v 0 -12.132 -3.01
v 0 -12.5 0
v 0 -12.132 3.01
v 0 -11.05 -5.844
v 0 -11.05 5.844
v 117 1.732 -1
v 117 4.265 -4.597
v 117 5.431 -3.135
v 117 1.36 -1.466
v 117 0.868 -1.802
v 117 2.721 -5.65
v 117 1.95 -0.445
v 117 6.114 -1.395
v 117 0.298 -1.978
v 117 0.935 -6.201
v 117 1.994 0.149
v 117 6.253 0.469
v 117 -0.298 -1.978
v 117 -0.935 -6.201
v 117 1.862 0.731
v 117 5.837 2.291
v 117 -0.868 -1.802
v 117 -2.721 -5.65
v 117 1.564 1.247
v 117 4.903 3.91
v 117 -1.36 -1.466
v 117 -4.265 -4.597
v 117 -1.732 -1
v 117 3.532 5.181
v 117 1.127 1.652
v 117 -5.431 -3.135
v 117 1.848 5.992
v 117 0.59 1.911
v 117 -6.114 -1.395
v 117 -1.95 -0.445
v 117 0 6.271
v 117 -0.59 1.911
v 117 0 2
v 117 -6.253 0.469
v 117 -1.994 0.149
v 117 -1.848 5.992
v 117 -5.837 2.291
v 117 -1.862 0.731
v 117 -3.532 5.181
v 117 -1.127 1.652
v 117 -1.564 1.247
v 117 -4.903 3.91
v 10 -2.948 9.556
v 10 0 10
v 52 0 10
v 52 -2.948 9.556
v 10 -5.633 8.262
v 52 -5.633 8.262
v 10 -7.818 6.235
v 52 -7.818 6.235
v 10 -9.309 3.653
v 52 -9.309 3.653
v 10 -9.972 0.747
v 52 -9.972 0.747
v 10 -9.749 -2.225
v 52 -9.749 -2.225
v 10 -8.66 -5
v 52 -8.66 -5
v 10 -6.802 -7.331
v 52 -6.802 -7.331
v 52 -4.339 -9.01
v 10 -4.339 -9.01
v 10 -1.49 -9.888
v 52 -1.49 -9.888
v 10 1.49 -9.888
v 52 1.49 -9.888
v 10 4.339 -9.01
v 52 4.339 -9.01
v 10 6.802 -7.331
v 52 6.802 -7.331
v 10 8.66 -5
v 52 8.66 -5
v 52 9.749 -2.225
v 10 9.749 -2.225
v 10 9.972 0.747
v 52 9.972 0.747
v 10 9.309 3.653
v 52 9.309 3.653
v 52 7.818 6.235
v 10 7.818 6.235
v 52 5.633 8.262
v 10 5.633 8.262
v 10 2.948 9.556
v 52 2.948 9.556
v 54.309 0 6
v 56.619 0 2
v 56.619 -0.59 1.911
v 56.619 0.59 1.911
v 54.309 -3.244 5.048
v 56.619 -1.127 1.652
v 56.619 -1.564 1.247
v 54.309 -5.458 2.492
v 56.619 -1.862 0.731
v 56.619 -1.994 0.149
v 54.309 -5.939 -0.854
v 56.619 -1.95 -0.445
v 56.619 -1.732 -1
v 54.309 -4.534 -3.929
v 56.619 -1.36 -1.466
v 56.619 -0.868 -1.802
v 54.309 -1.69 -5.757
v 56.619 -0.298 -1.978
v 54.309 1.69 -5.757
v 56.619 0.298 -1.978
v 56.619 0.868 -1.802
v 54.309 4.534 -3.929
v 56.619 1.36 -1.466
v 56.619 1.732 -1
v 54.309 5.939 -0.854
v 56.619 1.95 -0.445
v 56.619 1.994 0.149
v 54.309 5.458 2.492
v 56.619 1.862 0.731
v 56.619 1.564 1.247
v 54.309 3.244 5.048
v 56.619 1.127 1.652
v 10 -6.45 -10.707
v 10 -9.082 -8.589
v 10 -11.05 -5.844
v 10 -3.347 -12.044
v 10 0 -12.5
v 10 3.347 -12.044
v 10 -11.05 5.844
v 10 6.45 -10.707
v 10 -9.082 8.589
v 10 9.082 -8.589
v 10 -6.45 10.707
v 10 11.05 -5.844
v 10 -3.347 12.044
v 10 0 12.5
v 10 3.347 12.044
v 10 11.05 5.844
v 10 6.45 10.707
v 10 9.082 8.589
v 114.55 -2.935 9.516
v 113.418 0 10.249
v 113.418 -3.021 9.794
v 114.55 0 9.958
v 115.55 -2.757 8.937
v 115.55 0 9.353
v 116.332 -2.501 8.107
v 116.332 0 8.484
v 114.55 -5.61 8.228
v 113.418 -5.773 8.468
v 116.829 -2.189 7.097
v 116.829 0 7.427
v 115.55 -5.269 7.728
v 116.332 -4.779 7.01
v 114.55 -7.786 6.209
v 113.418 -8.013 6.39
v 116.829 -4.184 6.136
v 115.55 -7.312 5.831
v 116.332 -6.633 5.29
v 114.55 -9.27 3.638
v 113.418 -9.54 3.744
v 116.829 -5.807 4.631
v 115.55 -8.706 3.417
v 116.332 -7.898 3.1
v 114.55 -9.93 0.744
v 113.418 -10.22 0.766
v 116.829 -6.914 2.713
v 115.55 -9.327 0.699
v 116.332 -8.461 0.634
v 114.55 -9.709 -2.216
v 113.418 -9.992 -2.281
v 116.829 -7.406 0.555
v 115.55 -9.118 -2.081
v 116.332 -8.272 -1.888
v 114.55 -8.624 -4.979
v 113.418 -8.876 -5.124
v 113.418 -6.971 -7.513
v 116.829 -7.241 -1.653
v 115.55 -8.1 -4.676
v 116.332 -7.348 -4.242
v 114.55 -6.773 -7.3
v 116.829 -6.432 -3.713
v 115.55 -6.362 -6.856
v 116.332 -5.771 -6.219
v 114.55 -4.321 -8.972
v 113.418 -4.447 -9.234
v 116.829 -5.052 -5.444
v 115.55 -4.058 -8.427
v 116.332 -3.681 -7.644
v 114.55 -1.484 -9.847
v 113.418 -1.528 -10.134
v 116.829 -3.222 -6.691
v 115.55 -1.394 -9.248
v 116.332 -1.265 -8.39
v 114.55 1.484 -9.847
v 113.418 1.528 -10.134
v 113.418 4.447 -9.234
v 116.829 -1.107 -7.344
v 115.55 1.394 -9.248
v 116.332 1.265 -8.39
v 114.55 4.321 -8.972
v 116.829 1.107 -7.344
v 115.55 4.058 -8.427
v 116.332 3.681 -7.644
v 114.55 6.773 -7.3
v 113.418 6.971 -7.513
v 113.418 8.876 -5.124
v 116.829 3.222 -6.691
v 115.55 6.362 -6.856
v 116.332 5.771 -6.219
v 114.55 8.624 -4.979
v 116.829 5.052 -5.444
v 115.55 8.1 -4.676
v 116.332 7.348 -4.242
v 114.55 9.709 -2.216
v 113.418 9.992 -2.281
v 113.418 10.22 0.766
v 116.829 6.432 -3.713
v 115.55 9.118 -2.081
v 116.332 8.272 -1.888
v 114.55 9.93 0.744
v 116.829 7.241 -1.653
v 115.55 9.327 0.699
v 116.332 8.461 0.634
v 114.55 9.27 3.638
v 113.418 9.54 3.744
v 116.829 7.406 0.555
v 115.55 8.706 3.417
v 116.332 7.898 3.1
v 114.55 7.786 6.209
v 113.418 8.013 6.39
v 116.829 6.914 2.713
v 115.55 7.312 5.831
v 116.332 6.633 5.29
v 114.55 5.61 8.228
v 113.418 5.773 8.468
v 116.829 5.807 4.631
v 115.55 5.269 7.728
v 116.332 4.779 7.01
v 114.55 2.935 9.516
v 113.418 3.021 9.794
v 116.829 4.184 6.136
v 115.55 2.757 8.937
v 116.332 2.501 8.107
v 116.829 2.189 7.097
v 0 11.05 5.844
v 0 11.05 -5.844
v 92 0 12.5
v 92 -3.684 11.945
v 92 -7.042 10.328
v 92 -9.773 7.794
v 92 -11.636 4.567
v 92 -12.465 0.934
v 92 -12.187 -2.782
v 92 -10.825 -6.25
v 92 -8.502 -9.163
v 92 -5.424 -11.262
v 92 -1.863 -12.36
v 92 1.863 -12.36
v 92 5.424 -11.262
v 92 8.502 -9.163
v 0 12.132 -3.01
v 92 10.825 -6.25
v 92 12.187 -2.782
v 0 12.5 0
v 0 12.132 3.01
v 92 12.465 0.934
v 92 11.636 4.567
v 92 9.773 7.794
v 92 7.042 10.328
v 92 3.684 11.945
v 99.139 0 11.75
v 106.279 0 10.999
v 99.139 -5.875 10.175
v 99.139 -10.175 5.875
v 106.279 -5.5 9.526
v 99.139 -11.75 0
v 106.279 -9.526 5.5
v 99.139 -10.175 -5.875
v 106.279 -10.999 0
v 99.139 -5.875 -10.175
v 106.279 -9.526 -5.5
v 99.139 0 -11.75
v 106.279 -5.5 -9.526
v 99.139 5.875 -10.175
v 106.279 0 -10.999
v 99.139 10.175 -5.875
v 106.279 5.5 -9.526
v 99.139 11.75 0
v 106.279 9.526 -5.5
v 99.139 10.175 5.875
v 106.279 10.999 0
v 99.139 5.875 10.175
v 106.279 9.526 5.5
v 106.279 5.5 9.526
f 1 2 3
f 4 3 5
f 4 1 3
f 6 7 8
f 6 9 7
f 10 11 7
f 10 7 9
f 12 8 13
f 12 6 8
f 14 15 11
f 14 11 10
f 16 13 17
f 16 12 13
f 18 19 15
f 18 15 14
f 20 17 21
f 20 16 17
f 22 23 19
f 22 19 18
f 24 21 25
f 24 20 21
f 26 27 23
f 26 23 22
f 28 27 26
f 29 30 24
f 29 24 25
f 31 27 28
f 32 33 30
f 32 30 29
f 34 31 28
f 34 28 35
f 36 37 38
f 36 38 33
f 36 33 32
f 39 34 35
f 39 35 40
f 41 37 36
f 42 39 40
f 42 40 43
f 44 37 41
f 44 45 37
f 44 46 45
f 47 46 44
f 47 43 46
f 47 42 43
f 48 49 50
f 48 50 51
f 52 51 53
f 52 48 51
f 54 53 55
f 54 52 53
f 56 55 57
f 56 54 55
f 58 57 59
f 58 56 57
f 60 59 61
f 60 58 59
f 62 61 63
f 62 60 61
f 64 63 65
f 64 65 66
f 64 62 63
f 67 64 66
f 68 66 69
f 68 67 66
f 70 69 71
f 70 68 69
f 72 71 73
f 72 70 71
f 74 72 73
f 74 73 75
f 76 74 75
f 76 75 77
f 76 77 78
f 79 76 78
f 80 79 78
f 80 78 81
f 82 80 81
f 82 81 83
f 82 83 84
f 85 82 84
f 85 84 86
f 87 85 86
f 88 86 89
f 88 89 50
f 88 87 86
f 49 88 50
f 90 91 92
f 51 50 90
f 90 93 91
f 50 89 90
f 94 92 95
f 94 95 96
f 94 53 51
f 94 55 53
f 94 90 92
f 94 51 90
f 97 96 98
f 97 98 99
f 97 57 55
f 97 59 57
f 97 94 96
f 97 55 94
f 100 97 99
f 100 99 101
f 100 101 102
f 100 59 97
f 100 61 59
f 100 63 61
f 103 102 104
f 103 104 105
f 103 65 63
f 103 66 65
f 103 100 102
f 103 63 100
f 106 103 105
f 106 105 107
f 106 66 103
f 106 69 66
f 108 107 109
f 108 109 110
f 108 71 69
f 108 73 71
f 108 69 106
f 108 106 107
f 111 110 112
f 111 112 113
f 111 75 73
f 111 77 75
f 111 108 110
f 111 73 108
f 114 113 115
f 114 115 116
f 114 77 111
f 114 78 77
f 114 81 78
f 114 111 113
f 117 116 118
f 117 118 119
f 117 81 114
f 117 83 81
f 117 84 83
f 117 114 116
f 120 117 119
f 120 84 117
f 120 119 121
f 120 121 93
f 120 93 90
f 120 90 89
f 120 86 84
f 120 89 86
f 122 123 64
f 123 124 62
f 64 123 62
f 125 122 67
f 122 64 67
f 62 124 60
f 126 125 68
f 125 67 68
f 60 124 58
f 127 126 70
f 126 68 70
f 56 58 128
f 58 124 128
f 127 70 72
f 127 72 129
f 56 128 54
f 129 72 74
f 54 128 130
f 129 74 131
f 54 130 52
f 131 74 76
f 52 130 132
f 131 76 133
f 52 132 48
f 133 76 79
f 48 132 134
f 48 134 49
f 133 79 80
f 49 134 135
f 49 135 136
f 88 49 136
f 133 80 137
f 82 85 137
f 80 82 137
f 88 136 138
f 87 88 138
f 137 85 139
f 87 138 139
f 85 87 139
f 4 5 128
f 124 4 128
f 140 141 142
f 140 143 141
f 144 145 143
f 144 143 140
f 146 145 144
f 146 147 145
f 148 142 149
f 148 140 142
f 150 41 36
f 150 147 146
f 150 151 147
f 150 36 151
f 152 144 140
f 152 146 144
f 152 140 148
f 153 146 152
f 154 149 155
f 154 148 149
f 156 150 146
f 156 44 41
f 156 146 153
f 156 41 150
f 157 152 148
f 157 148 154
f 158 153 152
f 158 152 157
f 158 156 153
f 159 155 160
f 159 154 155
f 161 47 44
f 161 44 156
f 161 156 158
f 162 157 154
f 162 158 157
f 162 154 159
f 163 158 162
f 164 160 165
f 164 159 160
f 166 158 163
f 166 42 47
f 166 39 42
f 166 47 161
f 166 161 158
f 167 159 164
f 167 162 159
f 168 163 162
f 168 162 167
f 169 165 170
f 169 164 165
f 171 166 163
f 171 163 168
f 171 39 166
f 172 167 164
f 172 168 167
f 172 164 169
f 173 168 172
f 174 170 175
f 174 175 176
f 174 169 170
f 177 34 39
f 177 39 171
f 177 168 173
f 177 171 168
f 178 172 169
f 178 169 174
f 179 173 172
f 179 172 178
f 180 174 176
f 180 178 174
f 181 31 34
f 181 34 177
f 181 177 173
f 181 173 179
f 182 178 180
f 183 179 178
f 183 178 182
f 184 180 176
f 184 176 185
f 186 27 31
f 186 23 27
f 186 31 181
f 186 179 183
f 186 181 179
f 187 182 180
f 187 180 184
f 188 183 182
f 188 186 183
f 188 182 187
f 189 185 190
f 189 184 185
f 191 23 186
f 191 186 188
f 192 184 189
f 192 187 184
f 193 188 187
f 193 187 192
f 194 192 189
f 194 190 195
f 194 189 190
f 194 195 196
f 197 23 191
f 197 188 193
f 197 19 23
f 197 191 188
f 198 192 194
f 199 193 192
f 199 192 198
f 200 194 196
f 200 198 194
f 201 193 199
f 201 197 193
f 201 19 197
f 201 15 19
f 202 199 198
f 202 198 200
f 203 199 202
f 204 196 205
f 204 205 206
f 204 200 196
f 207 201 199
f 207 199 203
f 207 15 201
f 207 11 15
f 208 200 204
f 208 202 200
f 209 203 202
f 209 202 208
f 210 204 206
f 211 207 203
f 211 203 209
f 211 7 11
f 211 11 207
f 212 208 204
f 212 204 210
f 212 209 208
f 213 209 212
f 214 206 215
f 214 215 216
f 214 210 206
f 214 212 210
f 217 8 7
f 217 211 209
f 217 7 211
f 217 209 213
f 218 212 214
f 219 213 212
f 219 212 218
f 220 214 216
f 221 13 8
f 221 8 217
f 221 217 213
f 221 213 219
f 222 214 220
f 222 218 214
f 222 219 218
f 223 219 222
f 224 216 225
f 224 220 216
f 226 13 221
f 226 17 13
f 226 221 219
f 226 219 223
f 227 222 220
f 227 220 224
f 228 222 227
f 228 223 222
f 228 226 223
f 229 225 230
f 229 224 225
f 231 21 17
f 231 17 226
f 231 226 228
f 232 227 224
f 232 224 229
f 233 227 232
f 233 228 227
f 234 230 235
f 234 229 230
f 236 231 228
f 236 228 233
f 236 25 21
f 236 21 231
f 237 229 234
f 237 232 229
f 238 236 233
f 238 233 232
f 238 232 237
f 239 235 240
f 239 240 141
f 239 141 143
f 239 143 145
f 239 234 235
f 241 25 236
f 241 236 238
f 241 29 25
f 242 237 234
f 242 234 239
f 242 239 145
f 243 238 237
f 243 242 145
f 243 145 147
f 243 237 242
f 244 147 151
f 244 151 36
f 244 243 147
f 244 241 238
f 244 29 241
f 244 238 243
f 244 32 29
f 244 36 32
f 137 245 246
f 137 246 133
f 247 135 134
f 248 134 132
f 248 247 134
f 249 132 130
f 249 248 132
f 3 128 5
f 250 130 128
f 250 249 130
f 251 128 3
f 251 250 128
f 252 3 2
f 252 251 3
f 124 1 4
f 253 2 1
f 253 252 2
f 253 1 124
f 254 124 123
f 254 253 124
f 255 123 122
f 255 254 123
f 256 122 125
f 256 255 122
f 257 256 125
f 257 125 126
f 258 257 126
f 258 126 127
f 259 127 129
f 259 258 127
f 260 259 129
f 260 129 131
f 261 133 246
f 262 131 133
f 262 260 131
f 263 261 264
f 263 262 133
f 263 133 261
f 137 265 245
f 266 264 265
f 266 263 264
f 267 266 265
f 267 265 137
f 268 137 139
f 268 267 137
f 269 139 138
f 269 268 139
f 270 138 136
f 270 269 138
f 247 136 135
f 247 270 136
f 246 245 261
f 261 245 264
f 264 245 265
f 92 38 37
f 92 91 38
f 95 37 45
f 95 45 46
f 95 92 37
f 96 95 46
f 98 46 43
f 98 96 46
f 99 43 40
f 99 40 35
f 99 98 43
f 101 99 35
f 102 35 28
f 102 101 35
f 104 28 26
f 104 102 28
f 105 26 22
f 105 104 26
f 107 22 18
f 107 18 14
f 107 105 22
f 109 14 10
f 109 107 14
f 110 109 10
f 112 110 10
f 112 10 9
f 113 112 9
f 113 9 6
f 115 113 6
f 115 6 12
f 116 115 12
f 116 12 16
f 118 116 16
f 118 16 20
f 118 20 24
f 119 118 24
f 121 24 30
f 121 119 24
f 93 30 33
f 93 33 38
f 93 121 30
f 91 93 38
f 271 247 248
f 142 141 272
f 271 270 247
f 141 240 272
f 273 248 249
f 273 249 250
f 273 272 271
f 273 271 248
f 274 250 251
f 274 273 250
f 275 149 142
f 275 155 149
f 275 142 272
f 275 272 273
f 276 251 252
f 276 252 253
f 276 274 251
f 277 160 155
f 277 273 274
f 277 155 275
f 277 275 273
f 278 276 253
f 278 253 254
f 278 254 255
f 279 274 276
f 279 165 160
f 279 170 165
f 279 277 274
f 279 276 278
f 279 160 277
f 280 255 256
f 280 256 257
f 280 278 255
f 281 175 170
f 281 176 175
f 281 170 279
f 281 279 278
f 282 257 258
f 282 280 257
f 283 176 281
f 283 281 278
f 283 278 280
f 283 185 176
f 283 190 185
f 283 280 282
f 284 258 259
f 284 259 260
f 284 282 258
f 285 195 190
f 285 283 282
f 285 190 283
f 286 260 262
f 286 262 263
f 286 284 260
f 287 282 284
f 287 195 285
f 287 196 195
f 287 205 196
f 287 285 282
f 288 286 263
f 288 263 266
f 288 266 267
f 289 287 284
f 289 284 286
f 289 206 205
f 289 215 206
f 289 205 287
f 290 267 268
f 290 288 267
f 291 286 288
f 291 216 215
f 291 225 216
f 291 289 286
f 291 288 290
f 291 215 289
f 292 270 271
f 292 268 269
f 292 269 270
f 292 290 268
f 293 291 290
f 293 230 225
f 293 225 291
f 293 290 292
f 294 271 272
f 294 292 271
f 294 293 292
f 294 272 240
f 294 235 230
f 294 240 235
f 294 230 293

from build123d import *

# Parameters (mm, degrees)
ESQUISSE2_W             = 10
ESQUISSE2_H             = 22.1
ENL_V_MAT_EXTRU_1_DEPTH = 15


with BuildPart() as part:
    # Esquisse1 → Révolution1 (revolve)
    with BuildSketch(Plane.XY, mode=Mode.PRIVATE) as r_volution1_sk:
        with BuildLine():
            Line((56.618802154, 2), (52, 10))
            Line((52, 10), (0, 10))
            Line((0, 10), (0, 12.5))
            Line((0, 12.5), (92, 12.5))
            Line((92, 12.5), (113.418113853, 10.248865523))
            ThreePointArc((113.418113853, 10.248865523), (115.972579302, 8.947300367), (117, 6.270777941))
            Line((117, 6.270777941), (117, 2))
            Line((117, 2), (56.618802154, 2))
        make_face()
    revolve(r_volution1_sk.sketch.rotate(Axis((0, 0, 0), (1, 0, 0)), 90), axis=Axis((0, 0, 0), (1, 0, 0)))  # turned: the seam where the file's is

    # Esquisse2 → Enlèv. mat.-Extru.1 (cut, symmetric)
    with BuildSketch(Plane.XY):
        with Locations((5, 0)):
            Rectangle(ESQUISSE2_W, ESQUISSE2_H)
    extrude(amount=ENL_V_MAT_EXTRU_1_DEPTH, both=True, mode=Mode.SUBTRACT)


solid = part.part
